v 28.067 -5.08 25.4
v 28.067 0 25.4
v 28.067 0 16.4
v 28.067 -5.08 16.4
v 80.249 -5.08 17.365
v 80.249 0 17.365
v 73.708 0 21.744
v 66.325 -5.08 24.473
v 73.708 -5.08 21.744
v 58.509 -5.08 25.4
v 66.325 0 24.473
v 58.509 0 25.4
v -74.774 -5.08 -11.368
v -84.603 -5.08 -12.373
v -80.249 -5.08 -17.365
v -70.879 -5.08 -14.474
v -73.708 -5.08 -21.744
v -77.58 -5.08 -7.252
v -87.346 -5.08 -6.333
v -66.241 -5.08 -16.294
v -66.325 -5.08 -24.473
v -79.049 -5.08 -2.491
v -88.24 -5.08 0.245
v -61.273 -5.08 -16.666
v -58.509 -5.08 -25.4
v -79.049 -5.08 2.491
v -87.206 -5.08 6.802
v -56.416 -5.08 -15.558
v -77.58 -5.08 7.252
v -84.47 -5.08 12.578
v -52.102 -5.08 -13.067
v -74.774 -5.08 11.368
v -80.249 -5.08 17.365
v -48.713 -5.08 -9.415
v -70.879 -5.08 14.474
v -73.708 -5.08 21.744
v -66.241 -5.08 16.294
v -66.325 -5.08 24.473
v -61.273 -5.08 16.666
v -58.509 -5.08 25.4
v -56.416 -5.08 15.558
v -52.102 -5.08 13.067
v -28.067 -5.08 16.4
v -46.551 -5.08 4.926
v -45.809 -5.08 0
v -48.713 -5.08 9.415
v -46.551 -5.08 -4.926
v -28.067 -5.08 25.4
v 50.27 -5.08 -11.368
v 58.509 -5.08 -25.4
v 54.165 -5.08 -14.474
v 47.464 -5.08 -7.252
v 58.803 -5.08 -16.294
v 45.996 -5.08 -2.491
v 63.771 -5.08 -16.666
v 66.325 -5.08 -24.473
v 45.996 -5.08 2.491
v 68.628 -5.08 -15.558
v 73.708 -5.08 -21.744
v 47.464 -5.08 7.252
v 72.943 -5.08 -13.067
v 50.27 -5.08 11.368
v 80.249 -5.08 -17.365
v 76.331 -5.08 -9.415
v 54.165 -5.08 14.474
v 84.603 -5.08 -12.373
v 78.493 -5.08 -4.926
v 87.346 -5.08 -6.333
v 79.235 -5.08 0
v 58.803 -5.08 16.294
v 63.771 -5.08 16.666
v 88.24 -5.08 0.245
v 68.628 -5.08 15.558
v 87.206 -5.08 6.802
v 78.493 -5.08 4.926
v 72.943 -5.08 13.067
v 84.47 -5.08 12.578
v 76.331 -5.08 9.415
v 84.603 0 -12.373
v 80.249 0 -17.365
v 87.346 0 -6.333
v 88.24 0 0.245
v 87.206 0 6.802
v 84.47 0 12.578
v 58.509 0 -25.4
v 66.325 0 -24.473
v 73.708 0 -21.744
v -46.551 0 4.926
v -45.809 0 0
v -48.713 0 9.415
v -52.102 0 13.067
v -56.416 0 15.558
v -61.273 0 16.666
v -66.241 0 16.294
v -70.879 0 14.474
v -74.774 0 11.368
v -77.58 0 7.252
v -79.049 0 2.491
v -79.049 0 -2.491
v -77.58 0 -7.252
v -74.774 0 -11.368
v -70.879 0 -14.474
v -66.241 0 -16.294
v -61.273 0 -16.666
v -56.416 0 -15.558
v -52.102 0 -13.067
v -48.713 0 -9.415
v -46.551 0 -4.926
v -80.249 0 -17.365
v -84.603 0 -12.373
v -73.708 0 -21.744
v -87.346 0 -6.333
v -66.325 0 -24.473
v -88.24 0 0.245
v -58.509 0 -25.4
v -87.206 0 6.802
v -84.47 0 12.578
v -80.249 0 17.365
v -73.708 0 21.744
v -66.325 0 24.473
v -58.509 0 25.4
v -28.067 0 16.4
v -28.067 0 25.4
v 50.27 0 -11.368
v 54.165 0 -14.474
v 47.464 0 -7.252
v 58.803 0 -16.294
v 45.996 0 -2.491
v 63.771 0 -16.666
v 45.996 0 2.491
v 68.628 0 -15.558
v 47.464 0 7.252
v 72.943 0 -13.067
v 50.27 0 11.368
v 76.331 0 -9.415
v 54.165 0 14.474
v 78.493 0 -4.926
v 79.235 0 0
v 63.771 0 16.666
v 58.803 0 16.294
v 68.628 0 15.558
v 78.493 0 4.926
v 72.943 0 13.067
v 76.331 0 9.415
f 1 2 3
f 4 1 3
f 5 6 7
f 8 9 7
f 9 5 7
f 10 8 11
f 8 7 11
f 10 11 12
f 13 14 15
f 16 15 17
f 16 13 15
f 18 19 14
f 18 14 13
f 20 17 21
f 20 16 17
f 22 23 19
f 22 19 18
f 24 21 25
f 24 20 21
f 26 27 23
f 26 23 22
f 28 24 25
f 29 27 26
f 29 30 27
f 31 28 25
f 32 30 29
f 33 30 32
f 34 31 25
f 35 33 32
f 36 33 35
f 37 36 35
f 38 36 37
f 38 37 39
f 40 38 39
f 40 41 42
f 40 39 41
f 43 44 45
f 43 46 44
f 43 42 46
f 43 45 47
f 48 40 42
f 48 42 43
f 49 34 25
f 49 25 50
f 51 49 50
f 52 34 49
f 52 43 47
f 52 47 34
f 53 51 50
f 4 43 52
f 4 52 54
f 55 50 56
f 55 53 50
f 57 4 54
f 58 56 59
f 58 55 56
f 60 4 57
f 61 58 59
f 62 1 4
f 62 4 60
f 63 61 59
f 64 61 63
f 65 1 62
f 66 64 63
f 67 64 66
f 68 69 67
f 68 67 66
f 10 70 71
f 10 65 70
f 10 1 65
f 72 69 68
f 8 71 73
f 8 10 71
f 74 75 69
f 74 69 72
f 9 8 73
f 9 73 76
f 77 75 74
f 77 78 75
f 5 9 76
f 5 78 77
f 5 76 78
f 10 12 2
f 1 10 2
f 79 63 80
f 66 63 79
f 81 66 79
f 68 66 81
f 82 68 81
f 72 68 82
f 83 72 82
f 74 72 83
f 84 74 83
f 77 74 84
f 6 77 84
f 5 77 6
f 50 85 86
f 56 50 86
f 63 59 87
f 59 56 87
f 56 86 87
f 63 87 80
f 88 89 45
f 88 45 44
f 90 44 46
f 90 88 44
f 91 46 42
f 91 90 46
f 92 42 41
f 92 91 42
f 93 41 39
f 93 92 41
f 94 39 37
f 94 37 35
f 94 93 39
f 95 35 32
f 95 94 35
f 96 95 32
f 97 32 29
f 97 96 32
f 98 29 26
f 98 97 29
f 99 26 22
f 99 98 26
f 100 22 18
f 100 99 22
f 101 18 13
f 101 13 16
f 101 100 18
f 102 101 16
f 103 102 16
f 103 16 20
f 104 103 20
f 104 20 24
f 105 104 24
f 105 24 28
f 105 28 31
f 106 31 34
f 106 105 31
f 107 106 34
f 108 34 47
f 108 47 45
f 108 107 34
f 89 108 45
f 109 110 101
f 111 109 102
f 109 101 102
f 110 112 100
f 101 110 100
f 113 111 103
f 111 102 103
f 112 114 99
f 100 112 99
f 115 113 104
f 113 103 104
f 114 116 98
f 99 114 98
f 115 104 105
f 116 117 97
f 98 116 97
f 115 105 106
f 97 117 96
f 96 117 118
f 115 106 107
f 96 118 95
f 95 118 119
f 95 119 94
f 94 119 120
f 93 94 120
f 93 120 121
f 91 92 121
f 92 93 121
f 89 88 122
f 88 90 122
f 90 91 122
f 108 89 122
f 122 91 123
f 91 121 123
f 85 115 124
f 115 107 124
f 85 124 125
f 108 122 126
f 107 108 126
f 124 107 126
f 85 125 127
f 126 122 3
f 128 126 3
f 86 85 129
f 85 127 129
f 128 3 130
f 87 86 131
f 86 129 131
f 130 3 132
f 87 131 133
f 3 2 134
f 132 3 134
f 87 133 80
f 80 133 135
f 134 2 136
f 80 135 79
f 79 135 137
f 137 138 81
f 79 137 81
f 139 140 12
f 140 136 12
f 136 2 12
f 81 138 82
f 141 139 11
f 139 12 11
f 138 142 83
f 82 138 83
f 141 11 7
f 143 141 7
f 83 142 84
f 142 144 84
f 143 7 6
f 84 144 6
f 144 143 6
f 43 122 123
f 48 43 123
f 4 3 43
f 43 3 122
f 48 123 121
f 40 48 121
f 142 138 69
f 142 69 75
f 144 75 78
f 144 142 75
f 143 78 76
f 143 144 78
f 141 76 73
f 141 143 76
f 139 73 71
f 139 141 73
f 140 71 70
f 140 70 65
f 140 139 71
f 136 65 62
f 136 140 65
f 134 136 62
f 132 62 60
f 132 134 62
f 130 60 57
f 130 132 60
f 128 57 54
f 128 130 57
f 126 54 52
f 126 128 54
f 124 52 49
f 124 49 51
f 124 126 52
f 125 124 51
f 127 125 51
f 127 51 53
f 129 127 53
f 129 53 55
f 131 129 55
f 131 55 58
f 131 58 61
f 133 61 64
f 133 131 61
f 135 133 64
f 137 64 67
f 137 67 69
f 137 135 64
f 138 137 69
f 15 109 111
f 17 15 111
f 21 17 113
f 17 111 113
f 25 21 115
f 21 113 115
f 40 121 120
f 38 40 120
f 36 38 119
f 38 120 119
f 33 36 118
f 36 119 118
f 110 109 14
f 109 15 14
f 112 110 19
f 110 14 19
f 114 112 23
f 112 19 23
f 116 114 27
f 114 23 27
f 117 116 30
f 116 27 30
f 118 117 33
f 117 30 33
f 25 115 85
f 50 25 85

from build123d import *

# Parameters (mm, degrees)
F0_R        = 16.7132
F1_DEPTH    = 5.08
F2_T1_DEPTH = 172.212
F3_R        = 22.86
F4_R        = 22.86


# Not quite as in the source:
# - a fillet or chamfer that OpenCascade refuses, or shapes differently, is made with other operations: its cross-section is extruded or revolved along the edge and cut away or added


with BuildPart() as f1:
    # F0 (on Front) → F1 (new body)
    with BuildSketch(Plane.XZ):
        Polygon((-91.9353, -25.4), (91.9353, -25.4), (91.9353, 25.4), (28.067, 25.4), (28.067, 16.4), (-28.067, 16.4), (-28.067, 25.4), (-91.9353, 25.4), align=None)
        with Locations((-62.5221, 0)):
            Circle(F0_R, mode=Mode.SUBTRACT)
        with Locations((62.5221, 0)):
            Circle(F0_R, mode=Mode.SUBTRACT)
    extrude(amount=F1_DEPTH)

    # F2: fillet of radius 33.4264 on 4 edges, made by hand

    # F2_s2 → F2_t1 (cut)
    with BuildSketch(Plane.XZ.offset(-83.566)):
        with BuildLine():
            ThreePointArc((91.9353, -8.0264), (82.1449341107, 15.6096341107), (58.5089, 25.4))
            Line((58.5089, 25.4), (91.9353, 25.4))
            Line((91.9353, 25.4), (91.9353, -8.0264))
        make_face()
        with BuildLine():
            ThreePointArc((58.5089, -25.4), (82.1449341107, -15.6096341107), (91.9353, 8.0264))
            Line((91.9353, 8.0264), (91.9353, -25.4))
            Line((91.9353, -25.4), (58.5089, -25.4))
        make_face()
        with BuildLine():
            ThreePointArc((-58.5089, 25.4), (-82.1449341107, 15.6096341107), (-91.9353, -8.0264))
            Line((-91.9353, -8.0264), (-91.9353, 25.4))
            Line((-91.9353, 25.4), (-58.5089, 25.4))
        make_face()
        with BuildLine():
            ThreePointArc((-91.9353, 8.0264), (-82.1449341107, -15.6096341107), (-58.5089, -25.4))
            Line((-58.5089, -25.4), (-91.9353, -25.4))
            Line((-91.9353, -25.4), (-91.9353, 8.0264))
        make_face()
    extrude(amount=F2_T1_DEPTH, mode=Mode.SUBTRACT)

    # F3
    f3_edges = [f1.edges().sort_by_distance(p)[0] for p in [
        (-90.957338, -2.54, 0),
    ]]
    fillet(f3_edges, radius=F3_R)

    # F4
    f4_edges = [f1.edges().sort_by_distance(p)[0] for p in [
        (90.957338, -2.54, 0),
    ]]
    fillet(f4_edges, radius=F4_R)


solid = f1.part
